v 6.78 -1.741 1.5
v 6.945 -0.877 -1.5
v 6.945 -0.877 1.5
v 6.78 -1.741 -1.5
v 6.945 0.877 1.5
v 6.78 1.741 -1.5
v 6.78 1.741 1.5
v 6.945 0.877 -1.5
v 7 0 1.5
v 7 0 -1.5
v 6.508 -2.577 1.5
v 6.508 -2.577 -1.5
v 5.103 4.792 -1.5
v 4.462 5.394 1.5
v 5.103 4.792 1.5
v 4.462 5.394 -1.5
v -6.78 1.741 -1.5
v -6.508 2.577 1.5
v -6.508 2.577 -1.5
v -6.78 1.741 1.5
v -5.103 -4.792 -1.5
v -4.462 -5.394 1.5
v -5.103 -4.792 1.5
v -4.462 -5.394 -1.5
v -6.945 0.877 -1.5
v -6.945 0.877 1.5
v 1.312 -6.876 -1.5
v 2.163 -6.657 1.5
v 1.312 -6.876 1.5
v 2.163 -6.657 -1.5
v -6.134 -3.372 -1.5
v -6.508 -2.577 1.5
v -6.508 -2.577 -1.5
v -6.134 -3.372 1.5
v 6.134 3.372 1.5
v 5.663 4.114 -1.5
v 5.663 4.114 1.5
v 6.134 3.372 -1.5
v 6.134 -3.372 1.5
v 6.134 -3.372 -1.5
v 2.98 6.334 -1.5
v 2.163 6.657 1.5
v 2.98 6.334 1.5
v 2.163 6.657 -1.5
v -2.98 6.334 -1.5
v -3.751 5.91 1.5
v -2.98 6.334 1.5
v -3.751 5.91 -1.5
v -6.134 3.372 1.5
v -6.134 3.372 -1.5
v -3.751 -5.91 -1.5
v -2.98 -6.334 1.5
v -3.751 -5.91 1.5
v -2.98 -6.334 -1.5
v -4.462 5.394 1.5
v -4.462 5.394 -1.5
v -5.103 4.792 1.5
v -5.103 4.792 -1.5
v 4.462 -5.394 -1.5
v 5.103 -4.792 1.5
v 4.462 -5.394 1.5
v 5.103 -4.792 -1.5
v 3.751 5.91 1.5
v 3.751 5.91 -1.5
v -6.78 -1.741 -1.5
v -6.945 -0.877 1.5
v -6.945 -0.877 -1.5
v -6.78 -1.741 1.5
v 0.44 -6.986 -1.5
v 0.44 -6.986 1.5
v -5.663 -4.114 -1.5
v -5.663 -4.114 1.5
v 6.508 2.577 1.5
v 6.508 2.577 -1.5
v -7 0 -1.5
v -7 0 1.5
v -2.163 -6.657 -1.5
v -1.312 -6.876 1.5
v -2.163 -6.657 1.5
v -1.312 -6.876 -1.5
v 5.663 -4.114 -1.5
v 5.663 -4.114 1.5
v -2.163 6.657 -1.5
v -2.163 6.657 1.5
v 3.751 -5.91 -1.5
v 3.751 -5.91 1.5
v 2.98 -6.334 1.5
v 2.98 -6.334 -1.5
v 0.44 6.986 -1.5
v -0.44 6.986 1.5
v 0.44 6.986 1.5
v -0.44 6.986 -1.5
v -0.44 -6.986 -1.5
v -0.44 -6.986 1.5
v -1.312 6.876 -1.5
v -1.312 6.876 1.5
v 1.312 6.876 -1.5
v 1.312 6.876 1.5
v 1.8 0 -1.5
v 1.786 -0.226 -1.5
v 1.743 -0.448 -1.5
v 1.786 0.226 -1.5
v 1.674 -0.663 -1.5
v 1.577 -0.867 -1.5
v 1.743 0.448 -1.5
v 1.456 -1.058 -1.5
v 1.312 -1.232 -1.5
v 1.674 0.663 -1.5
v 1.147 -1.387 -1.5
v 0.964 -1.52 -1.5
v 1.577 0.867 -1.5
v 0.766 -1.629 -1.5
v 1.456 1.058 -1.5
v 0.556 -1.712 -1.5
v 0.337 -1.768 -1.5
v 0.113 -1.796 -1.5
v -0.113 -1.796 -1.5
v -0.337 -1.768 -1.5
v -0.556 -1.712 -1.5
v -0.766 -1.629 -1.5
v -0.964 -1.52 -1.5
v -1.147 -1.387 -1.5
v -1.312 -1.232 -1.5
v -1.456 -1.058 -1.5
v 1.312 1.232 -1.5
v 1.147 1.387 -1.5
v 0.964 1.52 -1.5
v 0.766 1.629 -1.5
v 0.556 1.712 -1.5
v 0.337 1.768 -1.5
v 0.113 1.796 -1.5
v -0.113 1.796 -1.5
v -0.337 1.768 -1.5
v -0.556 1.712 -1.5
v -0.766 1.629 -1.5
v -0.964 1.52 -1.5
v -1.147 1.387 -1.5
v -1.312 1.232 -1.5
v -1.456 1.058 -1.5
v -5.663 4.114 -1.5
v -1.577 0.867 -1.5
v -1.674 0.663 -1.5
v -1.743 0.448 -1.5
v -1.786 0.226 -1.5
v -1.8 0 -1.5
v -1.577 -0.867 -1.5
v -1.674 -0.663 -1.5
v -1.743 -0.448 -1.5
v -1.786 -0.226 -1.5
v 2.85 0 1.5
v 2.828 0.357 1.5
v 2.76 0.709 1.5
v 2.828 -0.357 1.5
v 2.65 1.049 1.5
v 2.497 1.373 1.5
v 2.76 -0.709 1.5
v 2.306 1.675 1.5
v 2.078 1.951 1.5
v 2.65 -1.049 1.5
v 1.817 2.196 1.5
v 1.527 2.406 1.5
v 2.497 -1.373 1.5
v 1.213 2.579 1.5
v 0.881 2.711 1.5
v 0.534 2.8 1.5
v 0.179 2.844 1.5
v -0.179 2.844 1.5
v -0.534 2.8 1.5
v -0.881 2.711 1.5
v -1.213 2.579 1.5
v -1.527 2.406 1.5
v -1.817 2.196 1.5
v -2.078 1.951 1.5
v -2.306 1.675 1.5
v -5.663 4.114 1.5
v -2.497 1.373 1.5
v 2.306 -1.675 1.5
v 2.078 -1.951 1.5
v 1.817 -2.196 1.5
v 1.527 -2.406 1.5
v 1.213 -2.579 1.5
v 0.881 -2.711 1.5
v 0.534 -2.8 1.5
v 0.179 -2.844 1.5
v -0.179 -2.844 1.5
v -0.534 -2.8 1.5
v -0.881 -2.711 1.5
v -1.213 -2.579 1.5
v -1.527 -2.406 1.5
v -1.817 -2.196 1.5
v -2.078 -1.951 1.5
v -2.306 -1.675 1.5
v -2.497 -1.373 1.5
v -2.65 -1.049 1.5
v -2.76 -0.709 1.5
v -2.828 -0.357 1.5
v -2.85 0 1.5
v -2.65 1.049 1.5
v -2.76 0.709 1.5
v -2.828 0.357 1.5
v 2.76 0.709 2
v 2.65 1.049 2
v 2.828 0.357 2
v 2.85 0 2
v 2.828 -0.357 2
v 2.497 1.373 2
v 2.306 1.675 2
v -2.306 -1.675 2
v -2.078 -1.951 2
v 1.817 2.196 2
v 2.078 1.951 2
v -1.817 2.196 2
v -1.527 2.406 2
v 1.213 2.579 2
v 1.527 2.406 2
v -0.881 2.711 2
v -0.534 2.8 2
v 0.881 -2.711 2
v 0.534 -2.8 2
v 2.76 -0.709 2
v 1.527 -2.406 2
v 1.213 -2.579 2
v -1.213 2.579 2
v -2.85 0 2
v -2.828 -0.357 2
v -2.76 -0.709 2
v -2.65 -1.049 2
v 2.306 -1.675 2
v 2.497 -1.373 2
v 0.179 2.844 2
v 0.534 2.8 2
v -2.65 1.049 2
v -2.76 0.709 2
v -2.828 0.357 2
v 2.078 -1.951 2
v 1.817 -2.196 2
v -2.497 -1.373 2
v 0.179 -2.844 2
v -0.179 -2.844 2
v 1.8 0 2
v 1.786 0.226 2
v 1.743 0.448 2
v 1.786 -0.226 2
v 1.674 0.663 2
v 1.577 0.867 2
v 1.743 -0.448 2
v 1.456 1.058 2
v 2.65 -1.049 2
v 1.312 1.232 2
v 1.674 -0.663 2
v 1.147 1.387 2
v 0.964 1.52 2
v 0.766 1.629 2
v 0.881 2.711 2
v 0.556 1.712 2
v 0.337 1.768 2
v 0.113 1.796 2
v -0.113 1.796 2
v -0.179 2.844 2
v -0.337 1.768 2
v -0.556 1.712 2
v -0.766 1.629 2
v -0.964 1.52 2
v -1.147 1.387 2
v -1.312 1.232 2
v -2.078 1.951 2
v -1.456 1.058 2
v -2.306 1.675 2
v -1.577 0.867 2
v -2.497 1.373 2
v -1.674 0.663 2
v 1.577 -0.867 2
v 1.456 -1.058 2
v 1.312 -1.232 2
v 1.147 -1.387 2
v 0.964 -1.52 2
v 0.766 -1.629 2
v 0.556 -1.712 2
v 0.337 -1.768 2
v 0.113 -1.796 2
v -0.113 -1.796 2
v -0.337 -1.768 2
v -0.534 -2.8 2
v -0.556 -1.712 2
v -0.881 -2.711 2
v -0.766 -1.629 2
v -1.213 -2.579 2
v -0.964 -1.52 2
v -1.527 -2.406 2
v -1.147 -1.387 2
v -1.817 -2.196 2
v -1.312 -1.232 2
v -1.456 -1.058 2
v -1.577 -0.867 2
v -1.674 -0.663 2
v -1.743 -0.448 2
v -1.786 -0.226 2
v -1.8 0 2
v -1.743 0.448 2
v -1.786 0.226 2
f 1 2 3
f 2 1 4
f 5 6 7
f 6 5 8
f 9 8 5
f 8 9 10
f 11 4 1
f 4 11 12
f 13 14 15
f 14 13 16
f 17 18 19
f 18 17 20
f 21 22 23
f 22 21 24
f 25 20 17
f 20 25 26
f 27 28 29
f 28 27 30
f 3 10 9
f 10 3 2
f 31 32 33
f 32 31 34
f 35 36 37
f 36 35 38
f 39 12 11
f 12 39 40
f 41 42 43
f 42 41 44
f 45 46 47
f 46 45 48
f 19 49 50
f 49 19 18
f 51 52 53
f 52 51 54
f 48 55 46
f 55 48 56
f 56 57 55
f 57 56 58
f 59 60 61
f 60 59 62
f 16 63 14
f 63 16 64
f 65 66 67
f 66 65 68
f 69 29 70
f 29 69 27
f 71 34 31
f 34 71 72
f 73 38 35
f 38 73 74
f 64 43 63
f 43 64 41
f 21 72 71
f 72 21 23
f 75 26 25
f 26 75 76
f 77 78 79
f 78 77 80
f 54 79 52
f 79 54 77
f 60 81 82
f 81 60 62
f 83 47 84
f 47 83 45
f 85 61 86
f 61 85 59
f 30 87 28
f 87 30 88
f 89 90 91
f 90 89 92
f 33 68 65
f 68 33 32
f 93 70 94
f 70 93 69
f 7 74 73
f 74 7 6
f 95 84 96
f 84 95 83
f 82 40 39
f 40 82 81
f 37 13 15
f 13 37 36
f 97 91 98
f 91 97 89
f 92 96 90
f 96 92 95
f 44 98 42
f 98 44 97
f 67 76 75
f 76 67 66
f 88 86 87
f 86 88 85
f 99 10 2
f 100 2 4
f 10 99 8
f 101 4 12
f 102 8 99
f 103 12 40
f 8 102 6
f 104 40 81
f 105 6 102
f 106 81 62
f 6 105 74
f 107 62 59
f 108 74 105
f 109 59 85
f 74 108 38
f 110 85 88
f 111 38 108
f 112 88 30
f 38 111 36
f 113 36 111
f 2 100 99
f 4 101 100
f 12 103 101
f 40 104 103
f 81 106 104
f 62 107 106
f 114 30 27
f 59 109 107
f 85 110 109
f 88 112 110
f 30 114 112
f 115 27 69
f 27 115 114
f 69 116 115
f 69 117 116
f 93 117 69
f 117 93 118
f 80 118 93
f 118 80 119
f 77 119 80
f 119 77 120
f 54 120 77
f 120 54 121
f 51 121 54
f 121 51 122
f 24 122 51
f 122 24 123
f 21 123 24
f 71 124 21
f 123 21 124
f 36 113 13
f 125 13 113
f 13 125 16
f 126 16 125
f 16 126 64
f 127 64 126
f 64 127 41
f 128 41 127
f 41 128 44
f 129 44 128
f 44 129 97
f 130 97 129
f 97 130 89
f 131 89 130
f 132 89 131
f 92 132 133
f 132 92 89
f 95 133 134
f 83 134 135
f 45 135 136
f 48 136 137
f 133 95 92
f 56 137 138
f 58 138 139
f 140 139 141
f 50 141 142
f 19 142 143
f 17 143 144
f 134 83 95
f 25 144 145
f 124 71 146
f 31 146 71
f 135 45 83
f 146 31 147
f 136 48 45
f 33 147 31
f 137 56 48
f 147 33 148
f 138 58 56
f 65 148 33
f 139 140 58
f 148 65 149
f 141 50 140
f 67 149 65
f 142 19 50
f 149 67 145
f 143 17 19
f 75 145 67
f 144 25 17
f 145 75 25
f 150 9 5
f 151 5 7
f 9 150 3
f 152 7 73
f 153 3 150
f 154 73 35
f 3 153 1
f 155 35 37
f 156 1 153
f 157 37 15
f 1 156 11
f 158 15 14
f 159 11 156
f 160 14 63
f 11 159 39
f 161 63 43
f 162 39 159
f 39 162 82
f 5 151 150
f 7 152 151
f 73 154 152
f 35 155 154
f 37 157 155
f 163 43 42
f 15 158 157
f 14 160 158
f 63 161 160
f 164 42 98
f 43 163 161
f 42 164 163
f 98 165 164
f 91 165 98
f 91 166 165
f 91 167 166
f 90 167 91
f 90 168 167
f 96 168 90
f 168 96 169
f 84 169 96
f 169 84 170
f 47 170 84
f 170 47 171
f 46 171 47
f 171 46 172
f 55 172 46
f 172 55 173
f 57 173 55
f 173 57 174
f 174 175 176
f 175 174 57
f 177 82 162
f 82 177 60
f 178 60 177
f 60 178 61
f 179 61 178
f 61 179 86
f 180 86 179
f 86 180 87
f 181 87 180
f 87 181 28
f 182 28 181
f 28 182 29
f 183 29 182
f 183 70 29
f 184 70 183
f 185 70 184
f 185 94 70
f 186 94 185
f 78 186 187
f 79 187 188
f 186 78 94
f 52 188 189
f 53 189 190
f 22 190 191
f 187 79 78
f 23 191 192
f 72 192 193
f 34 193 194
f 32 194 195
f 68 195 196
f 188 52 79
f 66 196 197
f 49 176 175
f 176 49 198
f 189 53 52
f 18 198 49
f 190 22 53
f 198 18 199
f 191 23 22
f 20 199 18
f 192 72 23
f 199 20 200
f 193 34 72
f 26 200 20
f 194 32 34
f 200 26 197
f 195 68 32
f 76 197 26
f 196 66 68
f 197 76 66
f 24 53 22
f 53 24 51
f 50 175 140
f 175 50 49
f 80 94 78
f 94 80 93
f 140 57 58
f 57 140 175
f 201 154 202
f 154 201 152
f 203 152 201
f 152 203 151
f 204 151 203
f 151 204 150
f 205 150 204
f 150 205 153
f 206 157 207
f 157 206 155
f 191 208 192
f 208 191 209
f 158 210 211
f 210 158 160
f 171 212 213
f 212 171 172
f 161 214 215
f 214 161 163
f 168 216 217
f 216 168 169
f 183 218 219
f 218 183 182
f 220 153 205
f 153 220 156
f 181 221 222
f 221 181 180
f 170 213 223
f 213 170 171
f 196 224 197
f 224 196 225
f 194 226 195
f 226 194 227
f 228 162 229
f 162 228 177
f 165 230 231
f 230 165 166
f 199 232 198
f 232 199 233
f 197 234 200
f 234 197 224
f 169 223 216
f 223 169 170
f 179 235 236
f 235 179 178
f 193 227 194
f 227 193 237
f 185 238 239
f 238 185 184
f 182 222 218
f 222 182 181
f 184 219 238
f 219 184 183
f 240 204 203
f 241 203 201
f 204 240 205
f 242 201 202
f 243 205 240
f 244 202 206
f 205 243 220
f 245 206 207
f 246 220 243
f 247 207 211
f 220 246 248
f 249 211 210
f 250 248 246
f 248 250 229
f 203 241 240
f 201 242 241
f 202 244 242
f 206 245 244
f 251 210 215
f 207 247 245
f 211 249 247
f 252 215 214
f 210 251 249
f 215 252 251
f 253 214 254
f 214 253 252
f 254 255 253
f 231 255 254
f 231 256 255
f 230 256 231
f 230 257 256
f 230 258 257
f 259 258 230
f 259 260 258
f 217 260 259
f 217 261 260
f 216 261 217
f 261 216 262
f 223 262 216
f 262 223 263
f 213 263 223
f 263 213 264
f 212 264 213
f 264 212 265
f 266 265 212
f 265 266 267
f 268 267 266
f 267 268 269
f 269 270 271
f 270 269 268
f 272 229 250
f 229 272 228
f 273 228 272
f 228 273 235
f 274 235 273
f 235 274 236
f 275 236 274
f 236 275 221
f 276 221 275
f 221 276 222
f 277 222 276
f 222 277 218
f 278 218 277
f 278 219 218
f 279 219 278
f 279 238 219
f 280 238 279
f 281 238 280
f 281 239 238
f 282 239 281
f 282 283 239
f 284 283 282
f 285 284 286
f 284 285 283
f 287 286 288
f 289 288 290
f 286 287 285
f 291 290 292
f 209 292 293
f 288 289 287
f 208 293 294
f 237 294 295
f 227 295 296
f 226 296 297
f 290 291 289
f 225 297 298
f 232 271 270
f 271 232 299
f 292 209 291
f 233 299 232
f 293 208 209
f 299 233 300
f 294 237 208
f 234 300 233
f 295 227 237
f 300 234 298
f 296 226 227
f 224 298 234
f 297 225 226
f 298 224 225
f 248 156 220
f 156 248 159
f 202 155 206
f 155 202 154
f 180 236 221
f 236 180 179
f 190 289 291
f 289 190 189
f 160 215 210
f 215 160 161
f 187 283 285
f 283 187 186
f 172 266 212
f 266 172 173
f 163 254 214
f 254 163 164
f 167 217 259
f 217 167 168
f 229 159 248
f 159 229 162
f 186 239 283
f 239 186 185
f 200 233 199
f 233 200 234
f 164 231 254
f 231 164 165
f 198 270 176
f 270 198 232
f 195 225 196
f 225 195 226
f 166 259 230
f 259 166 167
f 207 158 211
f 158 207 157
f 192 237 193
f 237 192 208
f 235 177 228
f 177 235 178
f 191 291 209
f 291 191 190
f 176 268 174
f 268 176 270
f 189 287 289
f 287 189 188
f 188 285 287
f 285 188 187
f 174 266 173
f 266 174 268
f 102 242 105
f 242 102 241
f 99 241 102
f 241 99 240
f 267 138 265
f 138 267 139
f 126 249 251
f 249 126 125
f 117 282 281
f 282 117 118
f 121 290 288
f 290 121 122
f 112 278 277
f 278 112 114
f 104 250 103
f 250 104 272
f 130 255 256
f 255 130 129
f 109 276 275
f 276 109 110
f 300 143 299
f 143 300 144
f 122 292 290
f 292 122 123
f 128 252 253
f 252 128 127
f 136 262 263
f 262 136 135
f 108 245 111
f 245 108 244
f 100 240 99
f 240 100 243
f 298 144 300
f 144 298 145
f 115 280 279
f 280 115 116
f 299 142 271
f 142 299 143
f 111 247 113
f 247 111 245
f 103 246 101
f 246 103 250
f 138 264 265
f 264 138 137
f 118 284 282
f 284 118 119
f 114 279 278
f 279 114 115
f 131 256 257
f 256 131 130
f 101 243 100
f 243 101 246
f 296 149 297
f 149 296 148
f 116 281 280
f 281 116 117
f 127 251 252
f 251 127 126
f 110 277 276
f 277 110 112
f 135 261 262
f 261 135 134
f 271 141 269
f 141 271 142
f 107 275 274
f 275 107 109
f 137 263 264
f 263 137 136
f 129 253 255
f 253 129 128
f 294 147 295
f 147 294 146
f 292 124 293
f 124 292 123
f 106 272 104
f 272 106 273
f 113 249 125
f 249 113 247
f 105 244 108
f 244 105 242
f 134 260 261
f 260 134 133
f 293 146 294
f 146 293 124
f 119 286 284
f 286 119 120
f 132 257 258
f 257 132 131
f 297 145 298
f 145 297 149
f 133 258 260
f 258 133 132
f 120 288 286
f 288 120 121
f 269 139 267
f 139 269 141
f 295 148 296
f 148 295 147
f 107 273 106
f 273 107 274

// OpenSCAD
$fn = 50;


difference() {
	union() {
		translate(v = [0, 0, -1.5000000000]) {
			cylinder(h = 3, r = 7.0000000000);
		}
		translate(v = [0, 0, -1.5000000000]) {
			cylinder(h = 3.5000000000, r = 2.8500000000);
		}
	}
	union() {
		translate(v = [0, 0, -50.0000000000]) {
			cylinder(h = 100, r = 1.8000000000);
		}
	}
}
